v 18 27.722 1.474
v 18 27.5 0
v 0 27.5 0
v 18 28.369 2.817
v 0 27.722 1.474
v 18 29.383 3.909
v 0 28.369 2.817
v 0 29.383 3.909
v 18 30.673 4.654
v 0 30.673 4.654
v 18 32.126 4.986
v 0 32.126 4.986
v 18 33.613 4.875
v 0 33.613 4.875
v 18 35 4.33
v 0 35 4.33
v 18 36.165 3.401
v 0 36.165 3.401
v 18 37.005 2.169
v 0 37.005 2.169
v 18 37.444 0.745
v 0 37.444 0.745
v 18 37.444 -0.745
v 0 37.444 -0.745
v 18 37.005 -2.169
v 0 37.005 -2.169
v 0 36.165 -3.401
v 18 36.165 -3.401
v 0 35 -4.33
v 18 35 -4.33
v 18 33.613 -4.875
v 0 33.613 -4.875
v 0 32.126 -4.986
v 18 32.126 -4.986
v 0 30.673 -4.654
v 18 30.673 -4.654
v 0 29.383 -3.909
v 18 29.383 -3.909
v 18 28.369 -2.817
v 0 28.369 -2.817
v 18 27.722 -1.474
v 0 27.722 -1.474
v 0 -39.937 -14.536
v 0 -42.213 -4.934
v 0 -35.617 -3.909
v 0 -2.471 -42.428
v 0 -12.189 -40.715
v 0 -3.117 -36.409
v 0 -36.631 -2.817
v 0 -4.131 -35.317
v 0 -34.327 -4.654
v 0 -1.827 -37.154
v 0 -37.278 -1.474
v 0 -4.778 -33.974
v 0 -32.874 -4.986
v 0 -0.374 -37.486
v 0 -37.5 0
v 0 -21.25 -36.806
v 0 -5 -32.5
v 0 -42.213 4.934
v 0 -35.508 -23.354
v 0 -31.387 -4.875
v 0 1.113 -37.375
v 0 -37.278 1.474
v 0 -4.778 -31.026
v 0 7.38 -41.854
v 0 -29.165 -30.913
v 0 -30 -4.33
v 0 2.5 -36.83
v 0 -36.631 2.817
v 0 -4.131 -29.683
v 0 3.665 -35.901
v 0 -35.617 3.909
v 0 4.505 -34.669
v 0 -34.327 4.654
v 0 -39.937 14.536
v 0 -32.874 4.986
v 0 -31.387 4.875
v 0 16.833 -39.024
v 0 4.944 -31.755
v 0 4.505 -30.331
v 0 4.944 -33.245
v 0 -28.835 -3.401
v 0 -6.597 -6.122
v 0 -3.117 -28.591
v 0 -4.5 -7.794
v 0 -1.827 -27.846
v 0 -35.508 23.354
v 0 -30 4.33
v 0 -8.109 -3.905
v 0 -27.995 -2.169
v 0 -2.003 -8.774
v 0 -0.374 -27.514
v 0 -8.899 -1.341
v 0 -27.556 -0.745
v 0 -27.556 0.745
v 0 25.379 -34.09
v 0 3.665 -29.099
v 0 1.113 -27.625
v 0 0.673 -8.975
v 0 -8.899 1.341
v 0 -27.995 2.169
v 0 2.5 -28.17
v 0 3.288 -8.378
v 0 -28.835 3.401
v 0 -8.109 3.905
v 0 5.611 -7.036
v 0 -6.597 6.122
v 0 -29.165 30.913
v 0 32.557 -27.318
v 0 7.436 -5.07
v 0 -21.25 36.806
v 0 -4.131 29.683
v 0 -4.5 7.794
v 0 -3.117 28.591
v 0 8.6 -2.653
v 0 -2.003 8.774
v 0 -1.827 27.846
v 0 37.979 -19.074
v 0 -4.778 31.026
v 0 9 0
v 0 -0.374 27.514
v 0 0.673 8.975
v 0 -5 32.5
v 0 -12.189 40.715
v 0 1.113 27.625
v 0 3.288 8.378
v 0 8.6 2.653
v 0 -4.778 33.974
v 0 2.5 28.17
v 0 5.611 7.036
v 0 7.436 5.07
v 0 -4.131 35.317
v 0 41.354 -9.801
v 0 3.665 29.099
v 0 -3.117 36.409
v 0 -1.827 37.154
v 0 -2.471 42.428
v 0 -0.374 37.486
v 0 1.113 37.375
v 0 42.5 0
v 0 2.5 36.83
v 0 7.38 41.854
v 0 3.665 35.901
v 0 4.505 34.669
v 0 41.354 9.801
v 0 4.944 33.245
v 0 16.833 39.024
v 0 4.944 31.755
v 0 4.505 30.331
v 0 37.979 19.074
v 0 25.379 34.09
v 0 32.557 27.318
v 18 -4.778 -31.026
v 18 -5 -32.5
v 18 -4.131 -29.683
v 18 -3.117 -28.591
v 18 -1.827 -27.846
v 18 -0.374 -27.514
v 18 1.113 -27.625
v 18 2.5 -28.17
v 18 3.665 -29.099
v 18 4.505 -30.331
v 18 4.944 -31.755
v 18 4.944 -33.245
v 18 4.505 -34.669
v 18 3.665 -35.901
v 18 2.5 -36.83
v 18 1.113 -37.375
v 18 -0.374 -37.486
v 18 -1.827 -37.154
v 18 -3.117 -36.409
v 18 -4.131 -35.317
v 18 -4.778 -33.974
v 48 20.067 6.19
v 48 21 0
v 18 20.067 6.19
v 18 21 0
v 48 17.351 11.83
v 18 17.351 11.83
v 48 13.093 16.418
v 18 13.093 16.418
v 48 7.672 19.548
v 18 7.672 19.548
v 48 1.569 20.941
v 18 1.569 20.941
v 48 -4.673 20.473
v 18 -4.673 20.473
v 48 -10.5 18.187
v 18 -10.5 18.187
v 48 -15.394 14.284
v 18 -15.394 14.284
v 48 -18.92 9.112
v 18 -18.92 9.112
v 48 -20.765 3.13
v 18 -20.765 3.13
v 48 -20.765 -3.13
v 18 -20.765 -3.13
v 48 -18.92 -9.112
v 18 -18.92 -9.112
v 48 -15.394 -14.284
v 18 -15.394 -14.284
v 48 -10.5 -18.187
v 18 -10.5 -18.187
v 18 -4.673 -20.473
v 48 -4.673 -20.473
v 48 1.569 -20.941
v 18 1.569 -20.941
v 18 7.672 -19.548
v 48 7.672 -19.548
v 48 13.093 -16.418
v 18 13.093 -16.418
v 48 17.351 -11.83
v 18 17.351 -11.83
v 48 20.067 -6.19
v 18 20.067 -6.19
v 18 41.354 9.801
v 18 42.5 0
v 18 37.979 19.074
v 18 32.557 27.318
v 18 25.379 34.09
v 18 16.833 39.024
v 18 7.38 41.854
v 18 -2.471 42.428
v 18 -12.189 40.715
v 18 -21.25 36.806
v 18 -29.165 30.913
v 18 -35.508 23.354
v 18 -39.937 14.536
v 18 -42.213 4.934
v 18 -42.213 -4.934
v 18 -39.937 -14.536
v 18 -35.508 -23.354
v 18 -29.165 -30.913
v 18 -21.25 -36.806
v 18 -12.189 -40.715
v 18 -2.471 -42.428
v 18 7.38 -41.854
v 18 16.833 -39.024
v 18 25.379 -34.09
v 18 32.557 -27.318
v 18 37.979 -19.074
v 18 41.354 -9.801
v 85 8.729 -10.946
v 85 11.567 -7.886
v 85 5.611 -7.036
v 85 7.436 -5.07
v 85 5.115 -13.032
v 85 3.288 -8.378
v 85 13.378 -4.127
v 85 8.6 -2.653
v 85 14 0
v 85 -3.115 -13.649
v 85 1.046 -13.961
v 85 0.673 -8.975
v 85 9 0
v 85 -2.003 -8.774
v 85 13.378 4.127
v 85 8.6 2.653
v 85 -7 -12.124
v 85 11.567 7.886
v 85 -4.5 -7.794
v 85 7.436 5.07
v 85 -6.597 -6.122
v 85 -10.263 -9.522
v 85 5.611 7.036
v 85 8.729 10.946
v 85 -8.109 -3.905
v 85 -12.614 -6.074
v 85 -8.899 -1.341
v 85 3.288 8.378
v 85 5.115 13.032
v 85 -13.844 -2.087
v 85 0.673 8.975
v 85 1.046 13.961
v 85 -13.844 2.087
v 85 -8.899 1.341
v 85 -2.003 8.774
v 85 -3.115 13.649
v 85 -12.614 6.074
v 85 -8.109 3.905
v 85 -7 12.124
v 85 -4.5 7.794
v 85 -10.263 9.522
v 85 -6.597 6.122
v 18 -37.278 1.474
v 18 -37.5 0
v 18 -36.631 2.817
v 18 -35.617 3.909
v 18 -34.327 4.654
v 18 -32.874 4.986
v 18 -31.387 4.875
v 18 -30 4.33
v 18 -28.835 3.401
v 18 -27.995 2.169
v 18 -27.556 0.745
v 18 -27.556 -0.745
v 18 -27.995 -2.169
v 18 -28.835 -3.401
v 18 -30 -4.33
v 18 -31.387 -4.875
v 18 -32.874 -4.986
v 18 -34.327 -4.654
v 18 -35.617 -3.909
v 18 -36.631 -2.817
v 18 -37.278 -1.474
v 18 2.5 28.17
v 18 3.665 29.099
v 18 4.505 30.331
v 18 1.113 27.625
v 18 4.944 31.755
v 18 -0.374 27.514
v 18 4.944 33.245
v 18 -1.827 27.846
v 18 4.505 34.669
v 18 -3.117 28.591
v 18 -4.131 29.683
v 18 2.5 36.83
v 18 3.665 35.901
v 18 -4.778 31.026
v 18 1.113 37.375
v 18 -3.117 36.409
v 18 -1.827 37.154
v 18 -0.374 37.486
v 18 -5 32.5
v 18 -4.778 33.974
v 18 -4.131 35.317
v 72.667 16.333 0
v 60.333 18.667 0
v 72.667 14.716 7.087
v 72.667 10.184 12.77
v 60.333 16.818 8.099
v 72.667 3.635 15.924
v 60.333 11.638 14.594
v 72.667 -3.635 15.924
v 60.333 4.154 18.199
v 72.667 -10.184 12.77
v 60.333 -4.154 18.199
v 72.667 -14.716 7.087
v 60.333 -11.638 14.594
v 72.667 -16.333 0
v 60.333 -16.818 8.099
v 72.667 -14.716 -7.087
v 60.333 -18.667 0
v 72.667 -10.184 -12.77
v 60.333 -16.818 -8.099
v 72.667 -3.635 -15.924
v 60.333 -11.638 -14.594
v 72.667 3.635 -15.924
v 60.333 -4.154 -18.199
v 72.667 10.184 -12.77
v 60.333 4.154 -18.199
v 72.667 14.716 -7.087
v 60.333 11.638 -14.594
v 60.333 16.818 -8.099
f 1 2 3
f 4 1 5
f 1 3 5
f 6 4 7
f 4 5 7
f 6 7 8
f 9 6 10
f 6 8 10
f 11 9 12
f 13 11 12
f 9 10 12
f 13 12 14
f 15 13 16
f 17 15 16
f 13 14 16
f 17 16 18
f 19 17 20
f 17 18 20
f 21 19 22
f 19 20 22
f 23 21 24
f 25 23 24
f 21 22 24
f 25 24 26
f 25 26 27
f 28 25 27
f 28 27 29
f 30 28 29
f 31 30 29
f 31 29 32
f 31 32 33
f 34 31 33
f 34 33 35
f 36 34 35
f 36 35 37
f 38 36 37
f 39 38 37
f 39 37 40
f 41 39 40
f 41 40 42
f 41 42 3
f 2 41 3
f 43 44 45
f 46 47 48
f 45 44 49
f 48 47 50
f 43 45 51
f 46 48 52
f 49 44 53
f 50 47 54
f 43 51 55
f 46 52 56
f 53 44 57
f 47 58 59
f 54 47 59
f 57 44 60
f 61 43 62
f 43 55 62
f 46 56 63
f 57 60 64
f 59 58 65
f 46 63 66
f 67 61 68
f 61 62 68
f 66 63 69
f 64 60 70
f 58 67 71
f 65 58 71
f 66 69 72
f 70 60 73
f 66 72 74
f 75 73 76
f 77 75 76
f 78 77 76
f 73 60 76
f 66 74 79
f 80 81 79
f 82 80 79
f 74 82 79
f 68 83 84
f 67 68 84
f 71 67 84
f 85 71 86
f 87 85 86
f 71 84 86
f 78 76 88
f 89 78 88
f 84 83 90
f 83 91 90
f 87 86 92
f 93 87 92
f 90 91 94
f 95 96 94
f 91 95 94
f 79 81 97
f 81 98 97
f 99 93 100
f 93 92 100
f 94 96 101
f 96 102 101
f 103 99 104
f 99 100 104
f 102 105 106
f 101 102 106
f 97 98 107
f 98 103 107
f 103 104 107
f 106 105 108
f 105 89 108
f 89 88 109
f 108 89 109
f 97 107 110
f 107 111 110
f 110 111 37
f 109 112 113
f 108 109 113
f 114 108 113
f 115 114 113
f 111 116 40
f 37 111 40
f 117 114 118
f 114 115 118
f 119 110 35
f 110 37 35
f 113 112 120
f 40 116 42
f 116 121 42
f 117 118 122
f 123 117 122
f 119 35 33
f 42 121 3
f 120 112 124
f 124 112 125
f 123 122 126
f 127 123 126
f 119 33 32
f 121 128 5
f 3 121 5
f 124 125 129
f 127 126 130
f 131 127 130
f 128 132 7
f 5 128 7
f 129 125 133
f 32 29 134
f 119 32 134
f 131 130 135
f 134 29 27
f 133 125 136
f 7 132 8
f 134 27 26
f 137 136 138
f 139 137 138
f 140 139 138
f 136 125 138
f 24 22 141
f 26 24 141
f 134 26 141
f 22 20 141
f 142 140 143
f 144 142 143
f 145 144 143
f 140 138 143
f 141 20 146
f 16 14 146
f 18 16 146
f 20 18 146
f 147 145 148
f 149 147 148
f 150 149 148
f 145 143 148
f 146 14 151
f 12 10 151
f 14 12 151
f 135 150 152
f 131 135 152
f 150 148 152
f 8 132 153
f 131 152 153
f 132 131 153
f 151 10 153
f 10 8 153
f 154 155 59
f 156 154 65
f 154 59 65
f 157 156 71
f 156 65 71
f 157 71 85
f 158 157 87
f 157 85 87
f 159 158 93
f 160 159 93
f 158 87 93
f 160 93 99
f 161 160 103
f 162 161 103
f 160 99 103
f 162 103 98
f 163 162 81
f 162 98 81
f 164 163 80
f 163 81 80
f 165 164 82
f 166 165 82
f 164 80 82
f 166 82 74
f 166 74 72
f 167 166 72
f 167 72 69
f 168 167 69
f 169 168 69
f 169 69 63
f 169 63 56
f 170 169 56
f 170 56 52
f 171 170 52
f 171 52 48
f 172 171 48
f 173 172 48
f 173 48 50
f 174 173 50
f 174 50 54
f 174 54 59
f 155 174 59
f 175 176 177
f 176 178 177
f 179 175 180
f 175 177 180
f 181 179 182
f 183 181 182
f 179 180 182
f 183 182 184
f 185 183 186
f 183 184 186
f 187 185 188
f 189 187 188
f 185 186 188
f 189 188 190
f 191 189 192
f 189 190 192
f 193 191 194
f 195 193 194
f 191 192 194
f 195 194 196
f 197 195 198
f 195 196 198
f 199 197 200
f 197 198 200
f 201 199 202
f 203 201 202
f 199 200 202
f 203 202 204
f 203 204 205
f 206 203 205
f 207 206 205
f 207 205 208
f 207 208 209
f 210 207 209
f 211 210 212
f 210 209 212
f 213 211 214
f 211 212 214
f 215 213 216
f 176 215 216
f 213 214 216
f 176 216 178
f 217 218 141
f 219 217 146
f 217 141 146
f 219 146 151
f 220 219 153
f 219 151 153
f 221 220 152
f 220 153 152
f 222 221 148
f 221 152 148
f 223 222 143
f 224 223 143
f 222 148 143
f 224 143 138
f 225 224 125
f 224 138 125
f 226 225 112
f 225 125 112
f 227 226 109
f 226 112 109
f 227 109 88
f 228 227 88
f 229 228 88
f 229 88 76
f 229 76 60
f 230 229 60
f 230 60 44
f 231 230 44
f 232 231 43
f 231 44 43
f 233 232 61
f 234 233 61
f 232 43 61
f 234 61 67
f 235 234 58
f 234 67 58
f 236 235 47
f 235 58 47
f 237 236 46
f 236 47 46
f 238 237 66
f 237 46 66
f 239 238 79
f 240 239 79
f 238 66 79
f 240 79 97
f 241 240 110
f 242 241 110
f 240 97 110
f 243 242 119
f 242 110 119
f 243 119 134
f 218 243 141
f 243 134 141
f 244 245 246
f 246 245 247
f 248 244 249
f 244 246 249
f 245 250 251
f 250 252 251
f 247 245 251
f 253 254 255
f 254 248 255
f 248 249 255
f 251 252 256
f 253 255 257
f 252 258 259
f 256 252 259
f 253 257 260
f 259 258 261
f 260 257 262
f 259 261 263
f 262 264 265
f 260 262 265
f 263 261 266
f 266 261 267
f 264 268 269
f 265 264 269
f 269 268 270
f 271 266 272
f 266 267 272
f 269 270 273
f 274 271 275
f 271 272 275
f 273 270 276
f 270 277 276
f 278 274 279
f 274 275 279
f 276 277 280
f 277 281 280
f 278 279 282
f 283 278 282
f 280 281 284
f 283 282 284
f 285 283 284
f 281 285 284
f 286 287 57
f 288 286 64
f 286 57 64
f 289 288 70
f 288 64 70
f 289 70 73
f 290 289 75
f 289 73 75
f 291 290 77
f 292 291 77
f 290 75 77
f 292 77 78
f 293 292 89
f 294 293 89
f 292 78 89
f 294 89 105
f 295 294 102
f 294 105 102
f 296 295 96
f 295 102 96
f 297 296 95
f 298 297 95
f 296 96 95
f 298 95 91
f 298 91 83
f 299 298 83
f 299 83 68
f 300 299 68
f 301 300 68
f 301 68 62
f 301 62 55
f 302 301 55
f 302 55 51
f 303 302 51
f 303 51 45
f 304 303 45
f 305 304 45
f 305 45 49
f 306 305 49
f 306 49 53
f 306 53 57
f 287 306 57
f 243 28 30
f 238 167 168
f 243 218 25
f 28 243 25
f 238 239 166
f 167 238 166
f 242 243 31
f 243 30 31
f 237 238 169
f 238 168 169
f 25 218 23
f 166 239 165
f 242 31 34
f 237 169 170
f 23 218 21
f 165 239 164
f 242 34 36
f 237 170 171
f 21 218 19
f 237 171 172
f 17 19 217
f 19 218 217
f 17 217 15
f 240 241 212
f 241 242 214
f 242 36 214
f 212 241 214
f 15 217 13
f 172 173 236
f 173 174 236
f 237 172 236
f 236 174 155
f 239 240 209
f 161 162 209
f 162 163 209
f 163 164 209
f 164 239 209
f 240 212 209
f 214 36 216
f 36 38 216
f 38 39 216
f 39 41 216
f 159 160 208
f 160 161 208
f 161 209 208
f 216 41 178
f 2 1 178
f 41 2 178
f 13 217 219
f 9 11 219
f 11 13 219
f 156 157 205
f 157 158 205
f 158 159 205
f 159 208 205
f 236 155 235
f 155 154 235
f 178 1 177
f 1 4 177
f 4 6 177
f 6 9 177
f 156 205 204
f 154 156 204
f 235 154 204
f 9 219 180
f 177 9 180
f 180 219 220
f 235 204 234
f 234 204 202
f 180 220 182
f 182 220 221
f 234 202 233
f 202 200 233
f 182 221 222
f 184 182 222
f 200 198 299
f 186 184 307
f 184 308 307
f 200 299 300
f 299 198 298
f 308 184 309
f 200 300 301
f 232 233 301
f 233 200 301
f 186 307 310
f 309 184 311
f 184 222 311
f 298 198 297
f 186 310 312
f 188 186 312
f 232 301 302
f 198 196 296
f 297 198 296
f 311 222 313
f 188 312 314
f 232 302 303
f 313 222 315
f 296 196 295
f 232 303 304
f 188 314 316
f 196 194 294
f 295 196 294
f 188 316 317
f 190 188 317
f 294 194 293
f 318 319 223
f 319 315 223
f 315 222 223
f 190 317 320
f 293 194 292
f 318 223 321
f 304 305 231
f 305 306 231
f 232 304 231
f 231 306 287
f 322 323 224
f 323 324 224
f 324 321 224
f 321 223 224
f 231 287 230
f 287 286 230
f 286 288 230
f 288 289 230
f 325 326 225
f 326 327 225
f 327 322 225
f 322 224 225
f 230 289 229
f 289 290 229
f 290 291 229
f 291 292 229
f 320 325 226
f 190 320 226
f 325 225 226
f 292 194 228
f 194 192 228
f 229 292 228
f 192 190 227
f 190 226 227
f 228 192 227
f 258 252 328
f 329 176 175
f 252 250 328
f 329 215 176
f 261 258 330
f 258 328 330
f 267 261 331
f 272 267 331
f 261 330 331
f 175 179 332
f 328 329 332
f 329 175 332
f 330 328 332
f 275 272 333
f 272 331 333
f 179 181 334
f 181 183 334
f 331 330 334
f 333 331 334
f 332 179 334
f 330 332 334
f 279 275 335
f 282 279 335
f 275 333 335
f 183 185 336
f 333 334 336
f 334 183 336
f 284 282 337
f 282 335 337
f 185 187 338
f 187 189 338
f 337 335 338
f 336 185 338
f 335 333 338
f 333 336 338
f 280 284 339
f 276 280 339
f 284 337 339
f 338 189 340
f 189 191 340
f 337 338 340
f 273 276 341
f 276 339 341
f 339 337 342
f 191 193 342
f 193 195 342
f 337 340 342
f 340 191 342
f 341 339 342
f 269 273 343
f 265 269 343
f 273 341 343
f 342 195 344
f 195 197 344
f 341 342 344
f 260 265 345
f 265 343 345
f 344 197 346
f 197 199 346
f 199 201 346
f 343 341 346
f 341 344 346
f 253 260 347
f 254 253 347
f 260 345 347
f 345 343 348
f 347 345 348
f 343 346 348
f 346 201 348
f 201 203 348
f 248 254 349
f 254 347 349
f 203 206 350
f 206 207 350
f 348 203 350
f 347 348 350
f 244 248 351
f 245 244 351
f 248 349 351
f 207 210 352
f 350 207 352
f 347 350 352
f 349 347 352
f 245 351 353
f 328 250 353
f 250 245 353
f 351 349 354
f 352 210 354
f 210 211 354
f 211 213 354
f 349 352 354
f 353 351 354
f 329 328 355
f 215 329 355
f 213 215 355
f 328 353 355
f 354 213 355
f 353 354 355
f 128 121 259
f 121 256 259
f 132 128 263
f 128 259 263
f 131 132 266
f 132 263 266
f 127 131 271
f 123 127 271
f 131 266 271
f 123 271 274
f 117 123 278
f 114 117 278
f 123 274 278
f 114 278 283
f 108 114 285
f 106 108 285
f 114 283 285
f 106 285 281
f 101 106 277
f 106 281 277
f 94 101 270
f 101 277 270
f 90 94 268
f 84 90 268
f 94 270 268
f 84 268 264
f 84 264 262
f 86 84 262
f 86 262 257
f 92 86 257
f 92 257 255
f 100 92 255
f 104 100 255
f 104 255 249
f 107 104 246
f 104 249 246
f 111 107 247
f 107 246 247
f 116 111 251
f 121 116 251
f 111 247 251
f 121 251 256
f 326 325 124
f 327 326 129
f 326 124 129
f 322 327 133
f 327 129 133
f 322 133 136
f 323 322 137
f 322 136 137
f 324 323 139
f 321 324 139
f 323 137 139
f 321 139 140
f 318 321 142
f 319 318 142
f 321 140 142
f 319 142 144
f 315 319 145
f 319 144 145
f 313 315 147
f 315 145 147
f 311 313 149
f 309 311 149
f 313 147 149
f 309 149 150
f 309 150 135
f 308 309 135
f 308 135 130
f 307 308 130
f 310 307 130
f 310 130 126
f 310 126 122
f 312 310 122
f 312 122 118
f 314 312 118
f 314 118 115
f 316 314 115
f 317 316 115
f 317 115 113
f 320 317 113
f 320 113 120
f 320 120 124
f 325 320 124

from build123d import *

# Parameters (mm, degrees)
F3_D     = 10
F3_DEPTH = 18


with BuildPart() as f1:
    # F0 (on Top) → F1 (revolve)
    with BuildSketch(Plane.XY):
        Polygon((0, 42.5), (0, 9), (85, 9), (85, 14), (48, 21), (18, 21), (18, 42.5), align=None)
    revolve(axis=Axis((69.263607, 0, 0), (1, 0, 0)))

    # F3
    with Locations(Plane.YZ.offset(18)):
        with Locations((0, 32.5), (-32.5, 0), (0, -32.5), (32.5, 0)):
            Hole(F3_D / 2, depth=F3_DEPTH)


solid = f1.part
